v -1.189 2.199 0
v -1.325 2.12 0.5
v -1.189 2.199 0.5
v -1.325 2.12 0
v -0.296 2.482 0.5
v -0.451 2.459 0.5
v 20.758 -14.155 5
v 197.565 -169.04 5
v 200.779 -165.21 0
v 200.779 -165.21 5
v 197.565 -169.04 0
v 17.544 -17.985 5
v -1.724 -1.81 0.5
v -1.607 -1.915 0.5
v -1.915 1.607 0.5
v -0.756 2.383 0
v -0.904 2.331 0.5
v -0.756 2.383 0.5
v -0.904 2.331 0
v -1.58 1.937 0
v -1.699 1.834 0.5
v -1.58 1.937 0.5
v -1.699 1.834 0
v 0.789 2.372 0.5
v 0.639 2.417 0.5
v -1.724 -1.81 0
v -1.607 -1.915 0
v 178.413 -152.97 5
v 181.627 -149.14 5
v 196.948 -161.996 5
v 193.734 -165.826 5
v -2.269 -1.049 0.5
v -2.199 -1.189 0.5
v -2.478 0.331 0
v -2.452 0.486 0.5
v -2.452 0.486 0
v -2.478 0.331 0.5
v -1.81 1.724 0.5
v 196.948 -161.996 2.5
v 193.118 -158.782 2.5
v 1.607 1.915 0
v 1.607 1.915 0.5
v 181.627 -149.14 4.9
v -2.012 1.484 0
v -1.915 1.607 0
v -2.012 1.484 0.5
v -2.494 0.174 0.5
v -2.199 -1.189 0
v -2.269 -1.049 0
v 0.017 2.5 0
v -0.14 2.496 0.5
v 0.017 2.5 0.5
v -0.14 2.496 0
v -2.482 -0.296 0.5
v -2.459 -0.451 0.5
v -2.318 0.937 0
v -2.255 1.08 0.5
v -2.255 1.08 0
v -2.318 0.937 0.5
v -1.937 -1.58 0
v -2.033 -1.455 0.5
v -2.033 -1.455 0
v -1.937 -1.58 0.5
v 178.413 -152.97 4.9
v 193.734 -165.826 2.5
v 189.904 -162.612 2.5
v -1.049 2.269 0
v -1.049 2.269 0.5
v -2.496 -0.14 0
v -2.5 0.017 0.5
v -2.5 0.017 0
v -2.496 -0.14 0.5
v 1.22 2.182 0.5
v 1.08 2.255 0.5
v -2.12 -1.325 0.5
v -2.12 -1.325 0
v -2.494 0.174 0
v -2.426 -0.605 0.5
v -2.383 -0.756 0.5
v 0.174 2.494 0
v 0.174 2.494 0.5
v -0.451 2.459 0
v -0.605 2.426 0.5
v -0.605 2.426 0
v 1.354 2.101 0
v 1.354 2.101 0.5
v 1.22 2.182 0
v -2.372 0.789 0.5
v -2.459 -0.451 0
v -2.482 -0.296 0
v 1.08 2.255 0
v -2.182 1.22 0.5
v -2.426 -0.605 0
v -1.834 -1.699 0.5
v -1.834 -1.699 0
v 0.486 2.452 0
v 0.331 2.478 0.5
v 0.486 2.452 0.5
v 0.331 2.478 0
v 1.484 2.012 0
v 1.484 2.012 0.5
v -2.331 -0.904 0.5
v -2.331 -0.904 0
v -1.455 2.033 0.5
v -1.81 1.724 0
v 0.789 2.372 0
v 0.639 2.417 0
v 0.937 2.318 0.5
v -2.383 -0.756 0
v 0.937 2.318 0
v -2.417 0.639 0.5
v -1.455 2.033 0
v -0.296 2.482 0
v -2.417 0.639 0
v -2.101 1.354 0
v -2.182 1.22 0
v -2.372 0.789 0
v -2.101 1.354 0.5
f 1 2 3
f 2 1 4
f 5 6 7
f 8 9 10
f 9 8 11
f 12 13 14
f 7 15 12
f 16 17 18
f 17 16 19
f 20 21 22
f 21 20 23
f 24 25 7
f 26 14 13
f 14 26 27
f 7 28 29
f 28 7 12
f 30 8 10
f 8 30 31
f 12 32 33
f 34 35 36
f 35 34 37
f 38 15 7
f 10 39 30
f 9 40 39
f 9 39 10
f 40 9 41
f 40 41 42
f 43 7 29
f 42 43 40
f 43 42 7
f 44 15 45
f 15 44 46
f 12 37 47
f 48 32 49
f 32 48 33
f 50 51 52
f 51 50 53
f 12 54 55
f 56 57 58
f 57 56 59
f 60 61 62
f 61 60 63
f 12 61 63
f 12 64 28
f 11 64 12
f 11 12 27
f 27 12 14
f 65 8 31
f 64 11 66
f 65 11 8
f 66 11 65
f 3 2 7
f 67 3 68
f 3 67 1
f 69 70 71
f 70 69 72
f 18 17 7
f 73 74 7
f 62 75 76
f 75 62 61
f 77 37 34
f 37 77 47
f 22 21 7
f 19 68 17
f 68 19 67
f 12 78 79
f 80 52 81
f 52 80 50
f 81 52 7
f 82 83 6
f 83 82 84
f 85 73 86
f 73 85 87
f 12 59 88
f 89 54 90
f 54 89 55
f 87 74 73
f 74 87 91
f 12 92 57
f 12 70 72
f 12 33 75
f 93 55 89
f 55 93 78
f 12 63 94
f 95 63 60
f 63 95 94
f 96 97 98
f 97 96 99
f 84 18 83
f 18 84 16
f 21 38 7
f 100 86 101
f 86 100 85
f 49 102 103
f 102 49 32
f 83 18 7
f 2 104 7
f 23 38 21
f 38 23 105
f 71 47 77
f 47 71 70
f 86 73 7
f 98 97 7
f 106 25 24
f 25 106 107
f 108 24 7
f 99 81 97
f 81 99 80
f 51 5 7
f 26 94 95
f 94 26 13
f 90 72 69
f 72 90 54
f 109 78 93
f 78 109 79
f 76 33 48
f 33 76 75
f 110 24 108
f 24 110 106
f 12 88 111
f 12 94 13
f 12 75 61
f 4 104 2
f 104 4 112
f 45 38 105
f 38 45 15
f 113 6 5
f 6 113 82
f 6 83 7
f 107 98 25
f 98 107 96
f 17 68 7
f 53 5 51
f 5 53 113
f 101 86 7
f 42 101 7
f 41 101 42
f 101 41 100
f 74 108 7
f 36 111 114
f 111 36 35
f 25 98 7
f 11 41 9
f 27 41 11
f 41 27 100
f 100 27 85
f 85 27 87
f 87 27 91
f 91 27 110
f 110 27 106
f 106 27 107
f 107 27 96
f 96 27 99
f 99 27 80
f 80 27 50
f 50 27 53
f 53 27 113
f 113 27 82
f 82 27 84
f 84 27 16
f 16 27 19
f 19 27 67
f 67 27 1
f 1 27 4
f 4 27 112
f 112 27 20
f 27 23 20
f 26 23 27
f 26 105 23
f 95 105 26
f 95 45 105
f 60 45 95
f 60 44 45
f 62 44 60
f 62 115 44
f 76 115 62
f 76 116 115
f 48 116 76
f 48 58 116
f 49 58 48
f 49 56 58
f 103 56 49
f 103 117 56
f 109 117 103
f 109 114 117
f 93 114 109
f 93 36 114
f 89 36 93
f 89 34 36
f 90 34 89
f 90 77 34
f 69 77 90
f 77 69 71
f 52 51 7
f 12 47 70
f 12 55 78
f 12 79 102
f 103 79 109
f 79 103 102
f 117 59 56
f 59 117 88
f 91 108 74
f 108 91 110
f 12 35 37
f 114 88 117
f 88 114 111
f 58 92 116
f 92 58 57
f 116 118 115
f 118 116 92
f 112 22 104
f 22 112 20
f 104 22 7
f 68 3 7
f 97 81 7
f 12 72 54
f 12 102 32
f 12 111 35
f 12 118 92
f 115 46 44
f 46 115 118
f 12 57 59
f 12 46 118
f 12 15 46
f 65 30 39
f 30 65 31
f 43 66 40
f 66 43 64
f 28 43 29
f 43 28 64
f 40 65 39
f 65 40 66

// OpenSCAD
$fn=100;

l=260;
w=5;
d=25;

rotate([0,0,-40])
difference(){
    hull(){
        cylinder(d=w, h=.5);
        
        translate([d,-w/2,0])
        cube([l-d,w,w]);
    }

    
    hull(){
        translate([l-w*2,-w/2-.1,w/2])
        cube([w,w+1,w]);
        
        translate([l-d,-w/2-.1,w-.1])
        cube([w,w+1,w]);
    }
}
